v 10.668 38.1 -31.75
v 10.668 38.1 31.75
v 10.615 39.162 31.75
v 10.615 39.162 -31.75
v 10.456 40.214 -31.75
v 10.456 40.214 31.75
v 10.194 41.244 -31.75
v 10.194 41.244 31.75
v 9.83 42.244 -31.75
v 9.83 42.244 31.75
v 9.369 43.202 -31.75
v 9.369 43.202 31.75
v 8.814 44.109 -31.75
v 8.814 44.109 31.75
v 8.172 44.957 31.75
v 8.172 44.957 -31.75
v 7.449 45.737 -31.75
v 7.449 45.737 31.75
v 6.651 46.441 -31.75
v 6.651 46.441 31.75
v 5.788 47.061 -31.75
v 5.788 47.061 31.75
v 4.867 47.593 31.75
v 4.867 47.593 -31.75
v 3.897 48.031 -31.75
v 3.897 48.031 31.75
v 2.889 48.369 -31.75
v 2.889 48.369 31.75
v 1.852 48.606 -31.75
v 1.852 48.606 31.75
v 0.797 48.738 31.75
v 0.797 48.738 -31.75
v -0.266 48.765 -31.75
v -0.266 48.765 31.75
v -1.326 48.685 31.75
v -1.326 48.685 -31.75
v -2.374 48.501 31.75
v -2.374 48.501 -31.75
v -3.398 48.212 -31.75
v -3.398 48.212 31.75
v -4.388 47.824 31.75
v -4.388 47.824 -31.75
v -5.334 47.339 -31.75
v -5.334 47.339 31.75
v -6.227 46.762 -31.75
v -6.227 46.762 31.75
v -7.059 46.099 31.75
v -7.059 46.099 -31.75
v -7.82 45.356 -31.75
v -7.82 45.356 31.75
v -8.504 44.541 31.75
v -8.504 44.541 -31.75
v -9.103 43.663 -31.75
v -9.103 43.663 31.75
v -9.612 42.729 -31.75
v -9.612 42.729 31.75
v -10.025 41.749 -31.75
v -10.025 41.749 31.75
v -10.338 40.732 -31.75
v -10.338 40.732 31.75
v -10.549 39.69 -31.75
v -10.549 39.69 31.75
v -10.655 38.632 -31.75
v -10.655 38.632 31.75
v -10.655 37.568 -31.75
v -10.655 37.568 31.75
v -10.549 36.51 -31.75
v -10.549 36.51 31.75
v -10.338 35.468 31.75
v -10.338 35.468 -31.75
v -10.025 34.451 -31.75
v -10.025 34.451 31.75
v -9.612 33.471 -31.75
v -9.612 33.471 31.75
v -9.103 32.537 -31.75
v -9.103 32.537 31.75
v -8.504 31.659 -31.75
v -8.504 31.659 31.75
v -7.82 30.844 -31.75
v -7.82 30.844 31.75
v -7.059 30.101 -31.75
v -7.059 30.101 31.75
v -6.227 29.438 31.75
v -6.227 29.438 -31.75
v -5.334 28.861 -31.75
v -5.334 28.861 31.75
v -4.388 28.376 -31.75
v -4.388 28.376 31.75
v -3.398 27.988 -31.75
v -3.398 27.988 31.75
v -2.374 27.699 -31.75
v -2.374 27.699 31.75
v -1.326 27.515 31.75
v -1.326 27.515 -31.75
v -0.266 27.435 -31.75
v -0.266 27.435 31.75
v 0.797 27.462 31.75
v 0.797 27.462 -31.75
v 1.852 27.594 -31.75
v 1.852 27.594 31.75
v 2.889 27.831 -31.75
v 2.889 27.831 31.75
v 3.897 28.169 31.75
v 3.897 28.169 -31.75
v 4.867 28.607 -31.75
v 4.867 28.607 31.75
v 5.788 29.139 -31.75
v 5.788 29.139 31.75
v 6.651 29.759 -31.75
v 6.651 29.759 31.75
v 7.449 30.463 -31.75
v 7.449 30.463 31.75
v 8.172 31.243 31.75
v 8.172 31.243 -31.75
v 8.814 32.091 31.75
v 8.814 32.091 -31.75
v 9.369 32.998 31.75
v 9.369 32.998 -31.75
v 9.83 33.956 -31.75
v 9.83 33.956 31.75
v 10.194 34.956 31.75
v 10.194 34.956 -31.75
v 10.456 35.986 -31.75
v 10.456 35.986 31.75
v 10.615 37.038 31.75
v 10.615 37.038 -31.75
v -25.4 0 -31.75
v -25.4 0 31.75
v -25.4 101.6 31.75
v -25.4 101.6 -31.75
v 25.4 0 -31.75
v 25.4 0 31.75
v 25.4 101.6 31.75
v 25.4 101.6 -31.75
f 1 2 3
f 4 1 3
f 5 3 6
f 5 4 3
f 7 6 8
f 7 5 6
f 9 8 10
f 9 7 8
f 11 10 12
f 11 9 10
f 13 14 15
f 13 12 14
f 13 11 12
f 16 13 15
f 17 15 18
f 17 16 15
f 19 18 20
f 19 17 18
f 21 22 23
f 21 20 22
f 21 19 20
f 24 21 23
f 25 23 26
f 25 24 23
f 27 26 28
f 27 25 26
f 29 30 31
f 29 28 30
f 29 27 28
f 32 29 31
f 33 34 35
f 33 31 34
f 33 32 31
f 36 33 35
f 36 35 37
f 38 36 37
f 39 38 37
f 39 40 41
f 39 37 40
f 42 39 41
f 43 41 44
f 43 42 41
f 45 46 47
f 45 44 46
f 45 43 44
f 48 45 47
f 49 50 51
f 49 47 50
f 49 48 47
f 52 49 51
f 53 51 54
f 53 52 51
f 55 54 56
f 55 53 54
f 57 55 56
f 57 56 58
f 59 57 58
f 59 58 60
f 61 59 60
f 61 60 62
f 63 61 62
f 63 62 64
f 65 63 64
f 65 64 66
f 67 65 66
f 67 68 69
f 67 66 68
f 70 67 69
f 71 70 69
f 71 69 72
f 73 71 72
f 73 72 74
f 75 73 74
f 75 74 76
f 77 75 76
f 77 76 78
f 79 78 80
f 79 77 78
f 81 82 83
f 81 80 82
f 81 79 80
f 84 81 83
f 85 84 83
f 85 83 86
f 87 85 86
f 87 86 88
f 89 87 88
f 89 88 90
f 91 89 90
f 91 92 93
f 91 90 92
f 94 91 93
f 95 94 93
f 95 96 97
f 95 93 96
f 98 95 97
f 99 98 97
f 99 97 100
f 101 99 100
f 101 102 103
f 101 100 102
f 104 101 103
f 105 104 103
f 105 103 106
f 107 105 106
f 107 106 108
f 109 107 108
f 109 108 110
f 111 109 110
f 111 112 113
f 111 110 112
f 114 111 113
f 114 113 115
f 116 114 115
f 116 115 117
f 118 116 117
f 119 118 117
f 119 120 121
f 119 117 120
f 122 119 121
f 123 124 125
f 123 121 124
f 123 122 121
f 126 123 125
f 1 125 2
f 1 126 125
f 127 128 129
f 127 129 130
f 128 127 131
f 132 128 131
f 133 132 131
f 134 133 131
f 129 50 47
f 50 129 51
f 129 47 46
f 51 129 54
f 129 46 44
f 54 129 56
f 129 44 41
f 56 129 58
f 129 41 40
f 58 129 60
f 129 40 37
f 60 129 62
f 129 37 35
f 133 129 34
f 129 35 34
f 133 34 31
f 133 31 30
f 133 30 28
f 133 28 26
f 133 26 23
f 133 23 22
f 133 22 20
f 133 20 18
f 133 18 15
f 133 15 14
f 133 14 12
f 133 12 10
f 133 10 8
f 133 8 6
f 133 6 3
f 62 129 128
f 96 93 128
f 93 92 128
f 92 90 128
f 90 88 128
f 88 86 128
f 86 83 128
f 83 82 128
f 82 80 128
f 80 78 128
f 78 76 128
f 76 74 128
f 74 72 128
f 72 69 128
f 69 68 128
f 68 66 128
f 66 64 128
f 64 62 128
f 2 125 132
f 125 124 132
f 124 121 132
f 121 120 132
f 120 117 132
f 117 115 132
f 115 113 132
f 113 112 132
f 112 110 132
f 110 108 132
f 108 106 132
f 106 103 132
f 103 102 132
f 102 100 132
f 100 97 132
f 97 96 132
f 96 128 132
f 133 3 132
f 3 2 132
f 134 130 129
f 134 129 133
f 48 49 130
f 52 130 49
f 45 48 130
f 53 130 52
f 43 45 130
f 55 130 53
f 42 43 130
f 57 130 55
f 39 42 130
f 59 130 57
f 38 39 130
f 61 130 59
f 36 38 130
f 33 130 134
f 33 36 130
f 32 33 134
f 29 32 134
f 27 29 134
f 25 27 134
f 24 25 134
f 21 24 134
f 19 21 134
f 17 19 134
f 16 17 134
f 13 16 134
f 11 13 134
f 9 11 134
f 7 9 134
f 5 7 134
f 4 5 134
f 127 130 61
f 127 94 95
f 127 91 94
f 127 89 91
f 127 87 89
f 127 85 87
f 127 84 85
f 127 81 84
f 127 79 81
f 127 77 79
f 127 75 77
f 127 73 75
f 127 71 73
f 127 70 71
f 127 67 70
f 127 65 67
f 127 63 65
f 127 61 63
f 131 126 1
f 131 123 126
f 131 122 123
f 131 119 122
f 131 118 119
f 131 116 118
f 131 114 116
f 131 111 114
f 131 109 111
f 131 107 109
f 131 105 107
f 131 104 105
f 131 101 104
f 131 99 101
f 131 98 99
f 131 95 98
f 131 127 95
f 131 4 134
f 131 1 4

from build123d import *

# Parameters (mm, degrees)
SKETCH1_W               = 50.8
SKETCH1_H               = 63.5
BOSS_EXTRUDE2_DEPTH     = 101.6
CUT_EXTRUDE2_DEPTH      = 110.433918417
CUT_EXTRUDE2_DEPTH_BACK = 110.433918417
SKETCH4_R               = 10.668


with BuildPart() as part:
    # Sketch1 → Boss-Extrude2 (new body)
    with BuildSketch(Plane(origin=(0, 0, 0), x_dir=(1, 0, 0), z_dir=(0, 1, 0))):
        Rectangle(SKETCH1_W, SKETCH1_H)
    extrude(amount=BOSS_EXTRUDE2_DEPTH)

    # Sketch4 → Cut-Extrude2 (cut, two sides: drawn at the far end of the back side and taken through both)
    with BuildSketch(Plane.XY.offset(-CUT_EXTRUDE2_DEPTH_BACK)):
        with Locations((0, 38.1)):
            Circle(SKETCH4_R)
    extrude(amount=CUT_EXTRUDE2_DEPTH + CUT_EXTRUDE2_DEPTH_BACK, mode=Mode.SUBTRACT)


solid = part.part
